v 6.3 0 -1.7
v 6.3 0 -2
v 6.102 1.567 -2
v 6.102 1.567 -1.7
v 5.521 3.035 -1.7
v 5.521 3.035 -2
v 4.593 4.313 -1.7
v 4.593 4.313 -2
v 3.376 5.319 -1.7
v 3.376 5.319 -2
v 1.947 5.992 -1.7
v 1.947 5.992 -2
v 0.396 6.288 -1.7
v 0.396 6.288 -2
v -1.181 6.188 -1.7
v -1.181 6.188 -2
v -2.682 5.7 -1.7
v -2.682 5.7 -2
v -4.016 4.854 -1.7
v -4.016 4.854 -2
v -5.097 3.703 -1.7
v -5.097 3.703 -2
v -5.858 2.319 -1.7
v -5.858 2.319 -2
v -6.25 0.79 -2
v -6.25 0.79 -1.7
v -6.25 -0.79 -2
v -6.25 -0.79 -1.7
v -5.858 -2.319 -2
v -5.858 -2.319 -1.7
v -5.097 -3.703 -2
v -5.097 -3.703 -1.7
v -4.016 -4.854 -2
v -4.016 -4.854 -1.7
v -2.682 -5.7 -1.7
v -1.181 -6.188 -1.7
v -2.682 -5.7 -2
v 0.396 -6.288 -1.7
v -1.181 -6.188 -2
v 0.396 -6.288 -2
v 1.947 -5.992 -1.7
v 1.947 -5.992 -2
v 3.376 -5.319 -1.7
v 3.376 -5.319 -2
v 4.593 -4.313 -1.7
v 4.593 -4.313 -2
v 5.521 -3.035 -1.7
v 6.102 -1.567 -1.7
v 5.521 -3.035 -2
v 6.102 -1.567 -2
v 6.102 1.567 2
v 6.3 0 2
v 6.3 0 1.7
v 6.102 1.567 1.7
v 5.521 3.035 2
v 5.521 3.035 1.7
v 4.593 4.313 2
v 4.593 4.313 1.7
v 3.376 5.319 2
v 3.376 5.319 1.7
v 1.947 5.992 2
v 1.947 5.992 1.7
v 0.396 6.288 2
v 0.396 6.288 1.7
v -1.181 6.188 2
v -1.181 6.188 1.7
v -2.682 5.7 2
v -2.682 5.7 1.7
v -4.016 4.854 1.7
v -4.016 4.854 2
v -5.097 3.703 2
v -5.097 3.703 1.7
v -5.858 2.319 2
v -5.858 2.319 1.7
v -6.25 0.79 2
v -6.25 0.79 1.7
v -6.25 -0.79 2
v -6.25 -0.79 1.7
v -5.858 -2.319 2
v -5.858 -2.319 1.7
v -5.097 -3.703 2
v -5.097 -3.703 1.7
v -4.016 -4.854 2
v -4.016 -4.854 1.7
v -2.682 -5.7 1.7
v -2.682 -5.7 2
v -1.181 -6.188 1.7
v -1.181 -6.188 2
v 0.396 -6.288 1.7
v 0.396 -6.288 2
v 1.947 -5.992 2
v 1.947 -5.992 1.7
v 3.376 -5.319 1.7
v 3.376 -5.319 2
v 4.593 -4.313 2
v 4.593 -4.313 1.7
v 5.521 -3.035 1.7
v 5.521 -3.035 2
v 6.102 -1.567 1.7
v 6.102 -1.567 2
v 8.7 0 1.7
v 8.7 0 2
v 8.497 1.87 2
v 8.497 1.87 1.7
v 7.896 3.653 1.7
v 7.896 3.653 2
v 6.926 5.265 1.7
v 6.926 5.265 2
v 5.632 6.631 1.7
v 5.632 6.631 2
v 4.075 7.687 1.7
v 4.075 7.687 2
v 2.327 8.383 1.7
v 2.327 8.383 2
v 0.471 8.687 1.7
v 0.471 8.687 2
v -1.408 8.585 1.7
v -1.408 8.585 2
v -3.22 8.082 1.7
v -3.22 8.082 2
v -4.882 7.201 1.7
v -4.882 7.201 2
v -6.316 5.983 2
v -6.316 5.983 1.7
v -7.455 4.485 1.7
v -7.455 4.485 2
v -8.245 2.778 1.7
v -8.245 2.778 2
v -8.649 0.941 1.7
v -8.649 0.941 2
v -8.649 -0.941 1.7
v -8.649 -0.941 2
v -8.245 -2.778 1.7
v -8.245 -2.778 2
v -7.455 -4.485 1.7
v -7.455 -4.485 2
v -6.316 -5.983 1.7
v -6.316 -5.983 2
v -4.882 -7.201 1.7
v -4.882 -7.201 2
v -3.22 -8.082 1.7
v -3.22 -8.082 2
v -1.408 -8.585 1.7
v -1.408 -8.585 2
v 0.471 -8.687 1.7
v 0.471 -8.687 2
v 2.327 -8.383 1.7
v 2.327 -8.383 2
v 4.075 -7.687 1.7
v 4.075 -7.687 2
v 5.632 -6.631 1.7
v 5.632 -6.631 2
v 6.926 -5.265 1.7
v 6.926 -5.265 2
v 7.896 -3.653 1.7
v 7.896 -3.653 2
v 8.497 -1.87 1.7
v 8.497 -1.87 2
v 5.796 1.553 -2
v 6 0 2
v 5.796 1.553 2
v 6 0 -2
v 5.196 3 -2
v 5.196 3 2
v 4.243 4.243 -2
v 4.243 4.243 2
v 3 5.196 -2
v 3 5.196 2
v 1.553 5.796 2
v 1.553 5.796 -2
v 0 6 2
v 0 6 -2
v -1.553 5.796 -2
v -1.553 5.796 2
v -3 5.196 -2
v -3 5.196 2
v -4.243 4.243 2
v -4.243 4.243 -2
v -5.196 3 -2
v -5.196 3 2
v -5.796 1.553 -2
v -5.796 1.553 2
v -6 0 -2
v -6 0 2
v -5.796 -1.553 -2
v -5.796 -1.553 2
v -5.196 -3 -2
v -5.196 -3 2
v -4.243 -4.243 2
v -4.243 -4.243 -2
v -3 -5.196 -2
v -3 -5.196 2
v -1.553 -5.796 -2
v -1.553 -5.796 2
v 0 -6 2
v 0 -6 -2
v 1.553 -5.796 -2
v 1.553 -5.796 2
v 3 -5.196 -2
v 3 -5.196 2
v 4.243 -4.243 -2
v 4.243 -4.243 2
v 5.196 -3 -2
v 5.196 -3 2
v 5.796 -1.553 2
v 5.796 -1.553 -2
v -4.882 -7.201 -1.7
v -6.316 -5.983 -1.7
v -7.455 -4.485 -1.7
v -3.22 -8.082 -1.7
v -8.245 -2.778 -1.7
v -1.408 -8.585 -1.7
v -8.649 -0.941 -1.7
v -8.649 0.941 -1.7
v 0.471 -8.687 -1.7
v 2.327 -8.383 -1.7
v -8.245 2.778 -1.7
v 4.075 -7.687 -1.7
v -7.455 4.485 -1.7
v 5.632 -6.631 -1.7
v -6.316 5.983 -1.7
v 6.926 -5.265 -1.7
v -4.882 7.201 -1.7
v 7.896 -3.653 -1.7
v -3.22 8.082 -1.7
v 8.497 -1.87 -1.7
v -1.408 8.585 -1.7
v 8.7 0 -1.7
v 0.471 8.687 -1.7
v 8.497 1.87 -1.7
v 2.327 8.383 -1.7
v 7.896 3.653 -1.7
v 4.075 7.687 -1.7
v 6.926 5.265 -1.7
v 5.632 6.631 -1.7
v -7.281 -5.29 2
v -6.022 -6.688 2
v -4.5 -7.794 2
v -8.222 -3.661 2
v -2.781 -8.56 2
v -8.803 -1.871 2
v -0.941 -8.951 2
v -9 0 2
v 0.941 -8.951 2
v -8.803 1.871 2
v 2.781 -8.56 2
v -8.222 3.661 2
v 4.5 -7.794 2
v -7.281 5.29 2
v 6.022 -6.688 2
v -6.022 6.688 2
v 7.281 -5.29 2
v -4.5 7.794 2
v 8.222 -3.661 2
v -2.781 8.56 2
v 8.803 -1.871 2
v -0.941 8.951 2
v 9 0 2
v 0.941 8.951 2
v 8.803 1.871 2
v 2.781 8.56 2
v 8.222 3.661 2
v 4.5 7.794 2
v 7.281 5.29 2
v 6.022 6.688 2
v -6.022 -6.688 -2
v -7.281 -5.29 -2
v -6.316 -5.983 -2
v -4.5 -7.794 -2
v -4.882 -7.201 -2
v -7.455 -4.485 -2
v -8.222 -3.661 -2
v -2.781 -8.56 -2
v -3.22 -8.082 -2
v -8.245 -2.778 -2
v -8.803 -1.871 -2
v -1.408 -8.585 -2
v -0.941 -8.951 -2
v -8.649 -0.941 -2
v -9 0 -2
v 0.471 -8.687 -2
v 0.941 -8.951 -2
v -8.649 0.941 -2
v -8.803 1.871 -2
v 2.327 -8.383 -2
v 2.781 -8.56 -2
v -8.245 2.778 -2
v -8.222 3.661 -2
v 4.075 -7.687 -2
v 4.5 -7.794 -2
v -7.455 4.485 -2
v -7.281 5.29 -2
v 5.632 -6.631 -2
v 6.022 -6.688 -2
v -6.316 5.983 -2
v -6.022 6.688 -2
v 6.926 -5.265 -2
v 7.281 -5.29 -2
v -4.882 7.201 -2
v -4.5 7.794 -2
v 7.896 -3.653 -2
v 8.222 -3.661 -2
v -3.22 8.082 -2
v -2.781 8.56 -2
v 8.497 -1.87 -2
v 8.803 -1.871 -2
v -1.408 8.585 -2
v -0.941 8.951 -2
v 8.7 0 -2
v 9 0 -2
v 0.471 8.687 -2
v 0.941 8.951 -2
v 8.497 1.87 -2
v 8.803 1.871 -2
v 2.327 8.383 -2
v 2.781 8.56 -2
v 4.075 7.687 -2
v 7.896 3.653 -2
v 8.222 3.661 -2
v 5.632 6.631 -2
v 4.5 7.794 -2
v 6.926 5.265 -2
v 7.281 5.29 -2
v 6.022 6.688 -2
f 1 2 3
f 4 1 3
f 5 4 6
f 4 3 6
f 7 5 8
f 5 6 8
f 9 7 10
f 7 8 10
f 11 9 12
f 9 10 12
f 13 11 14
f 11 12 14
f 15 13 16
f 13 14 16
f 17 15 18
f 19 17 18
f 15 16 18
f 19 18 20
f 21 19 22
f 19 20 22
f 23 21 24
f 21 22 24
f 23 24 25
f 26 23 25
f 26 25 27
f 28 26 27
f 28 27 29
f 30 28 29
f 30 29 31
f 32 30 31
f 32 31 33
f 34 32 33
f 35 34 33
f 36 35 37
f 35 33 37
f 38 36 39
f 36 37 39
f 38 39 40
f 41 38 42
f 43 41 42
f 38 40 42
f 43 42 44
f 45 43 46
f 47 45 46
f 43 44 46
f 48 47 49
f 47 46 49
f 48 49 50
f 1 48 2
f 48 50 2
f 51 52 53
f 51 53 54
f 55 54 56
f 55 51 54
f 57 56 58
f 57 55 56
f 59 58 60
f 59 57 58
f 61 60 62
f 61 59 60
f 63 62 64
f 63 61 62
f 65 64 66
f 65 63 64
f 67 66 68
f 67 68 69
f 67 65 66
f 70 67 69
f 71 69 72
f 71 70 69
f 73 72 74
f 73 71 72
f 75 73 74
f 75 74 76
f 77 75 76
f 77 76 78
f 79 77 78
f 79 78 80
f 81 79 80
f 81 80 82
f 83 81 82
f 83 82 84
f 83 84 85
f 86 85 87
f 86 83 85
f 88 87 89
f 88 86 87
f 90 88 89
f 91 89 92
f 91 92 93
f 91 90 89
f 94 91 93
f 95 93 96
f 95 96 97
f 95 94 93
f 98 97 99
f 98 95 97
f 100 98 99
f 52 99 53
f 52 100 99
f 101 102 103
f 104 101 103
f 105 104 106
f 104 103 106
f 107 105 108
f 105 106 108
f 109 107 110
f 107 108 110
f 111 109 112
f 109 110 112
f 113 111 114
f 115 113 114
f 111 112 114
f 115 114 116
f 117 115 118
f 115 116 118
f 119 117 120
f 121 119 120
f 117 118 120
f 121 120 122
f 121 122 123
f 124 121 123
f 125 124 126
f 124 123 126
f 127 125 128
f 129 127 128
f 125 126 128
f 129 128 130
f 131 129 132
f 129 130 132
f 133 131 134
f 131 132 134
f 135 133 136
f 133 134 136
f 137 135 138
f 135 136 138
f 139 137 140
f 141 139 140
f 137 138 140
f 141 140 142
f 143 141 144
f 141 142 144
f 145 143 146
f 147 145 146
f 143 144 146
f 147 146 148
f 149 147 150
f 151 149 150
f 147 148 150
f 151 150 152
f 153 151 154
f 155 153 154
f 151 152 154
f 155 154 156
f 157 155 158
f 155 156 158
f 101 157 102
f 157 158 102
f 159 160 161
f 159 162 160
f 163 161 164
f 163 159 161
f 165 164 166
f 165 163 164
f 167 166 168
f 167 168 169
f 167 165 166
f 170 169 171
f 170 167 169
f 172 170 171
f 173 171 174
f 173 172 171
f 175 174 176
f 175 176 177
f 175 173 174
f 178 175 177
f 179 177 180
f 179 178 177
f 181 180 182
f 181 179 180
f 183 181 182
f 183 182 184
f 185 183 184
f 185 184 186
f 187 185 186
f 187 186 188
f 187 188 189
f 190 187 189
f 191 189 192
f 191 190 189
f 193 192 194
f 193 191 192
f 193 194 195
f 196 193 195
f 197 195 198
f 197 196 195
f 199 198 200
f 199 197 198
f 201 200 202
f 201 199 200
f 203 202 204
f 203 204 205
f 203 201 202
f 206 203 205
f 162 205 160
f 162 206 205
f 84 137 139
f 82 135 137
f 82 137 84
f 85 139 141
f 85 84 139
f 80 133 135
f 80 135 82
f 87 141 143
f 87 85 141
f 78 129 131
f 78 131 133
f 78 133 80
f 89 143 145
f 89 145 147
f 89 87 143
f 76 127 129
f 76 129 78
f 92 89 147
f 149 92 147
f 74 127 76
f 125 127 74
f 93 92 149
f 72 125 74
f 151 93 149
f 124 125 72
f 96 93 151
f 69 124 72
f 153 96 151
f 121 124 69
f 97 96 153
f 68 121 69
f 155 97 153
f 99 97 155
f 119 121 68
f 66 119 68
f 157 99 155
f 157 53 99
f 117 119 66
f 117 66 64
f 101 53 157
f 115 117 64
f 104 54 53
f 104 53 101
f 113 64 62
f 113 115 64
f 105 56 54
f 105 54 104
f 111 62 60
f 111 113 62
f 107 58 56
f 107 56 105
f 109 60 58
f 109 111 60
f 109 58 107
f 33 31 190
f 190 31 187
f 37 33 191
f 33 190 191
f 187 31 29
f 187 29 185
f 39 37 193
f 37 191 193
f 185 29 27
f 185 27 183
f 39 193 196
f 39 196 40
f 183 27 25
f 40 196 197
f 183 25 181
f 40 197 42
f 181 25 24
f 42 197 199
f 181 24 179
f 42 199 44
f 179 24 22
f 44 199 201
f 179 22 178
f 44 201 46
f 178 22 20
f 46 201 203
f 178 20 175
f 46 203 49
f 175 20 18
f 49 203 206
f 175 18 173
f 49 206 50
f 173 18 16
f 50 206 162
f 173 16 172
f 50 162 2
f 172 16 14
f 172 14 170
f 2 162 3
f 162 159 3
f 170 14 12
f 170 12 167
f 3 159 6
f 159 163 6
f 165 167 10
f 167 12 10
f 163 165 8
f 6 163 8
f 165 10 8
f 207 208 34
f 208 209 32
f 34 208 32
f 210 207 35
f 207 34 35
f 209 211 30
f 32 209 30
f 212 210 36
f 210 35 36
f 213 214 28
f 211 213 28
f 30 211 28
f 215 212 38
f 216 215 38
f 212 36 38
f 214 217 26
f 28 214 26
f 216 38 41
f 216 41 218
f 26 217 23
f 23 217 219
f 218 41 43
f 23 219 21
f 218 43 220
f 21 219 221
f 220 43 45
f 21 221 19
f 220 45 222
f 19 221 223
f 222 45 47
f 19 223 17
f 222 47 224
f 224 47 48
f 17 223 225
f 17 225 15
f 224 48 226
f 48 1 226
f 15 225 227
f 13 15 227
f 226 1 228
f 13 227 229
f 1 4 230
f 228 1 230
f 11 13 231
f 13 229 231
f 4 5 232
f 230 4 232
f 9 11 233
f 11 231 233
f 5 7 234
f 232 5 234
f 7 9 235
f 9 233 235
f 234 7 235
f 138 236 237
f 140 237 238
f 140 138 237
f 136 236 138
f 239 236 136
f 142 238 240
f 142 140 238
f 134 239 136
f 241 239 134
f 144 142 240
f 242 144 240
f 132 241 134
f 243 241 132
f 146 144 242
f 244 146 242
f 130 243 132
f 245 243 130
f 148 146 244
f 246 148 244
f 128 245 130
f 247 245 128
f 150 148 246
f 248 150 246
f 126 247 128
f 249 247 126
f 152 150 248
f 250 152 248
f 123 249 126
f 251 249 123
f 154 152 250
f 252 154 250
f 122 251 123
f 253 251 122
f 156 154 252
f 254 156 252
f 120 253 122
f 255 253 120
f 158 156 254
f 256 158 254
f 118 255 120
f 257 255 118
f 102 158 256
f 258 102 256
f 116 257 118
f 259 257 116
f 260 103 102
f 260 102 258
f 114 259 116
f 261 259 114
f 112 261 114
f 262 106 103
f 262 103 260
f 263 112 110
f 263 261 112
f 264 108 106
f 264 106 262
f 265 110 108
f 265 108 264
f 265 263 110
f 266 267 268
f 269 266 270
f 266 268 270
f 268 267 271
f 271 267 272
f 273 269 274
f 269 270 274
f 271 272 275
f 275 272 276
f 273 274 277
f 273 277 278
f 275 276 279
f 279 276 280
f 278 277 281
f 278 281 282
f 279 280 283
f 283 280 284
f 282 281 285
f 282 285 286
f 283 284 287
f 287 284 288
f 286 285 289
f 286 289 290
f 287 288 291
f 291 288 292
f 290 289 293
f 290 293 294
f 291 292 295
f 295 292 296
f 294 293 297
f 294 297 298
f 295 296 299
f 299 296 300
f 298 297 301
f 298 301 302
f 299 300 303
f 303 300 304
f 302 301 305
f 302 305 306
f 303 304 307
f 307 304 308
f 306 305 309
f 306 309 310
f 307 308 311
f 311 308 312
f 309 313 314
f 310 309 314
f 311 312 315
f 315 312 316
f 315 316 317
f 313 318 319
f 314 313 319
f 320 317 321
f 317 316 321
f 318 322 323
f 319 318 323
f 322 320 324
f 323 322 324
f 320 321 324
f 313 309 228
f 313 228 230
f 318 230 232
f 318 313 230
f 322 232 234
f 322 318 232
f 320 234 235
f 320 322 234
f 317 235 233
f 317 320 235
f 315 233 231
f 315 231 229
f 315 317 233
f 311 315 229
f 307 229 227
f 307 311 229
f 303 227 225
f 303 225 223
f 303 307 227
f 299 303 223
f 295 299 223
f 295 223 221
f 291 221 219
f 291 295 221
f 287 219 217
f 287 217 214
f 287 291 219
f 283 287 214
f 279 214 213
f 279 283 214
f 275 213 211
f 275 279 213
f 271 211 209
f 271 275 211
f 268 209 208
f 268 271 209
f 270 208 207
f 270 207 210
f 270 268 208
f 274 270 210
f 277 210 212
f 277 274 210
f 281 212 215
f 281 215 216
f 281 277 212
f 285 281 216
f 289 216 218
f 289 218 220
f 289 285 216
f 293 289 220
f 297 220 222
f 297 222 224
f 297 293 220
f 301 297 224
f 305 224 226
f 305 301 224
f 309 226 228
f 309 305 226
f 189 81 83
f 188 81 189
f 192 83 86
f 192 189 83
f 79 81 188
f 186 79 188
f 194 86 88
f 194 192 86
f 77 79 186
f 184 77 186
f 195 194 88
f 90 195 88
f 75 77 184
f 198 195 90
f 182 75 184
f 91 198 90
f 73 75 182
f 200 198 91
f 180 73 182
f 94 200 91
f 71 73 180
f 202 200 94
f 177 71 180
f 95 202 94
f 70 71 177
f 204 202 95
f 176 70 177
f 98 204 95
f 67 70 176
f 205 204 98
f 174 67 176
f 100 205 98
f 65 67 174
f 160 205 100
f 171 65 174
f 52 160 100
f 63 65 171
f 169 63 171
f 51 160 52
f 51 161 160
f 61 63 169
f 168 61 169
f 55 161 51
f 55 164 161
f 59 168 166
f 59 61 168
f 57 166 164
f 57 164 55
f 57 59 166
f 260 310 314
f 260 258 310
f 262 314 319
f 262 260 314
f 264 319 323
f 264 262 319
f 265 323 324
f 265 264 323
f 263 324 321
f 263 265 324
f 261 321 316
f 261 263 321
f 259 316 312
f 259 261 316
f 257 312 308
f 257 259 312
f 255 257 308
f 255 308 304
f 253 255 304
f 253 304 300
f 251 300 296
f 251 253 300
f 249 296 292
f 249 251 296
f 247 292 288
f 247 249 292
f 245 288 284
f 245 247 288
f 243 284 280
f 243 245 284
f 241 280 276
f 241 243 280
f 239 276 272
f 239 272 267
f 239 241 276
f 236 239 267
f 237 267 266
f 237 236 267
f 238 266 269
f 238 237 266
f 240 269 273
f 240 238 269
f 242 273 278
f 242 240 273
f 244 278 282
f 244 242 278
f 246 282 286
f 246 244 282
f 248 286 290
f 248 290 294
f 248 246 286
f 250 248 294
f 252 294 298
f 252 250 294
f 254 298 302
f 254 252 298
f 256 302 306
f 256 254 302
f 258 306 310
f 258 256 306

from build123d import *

# Parameters (mm, degrees)
SKETCH_1_R          = 9
SKETCH_1_R_2        = 6
EXTRUDE_1_DEPTH     = 2
SKETCH_2_R          = 8.7
SKETCH_2_R_2        = 6.3
CUT_EXTRUDE_1_DEPTH = 0.3


with BuildPart() as part:
    # 草图1 → 凸台-拉伸1 (new, symmetric)
    with BuildSketch(Plane.XY):
        Circle(SKETCH_1_R)
        Circle(SKETCH_1_R_2, mode=Mode.SUBTRACT)
    extrude(amount=EXTRUDE_1_DEPTH, both=True)

    # 草图2 → 切除-拉伸1 (cut)
    with BuildSketch(Plane.XY.offset(2)):
        Circle(SKETCH_2_R)
        Circle(SKETCH_2_R_2, mode=Mode.SUBTRACT)
    cut_extrude_1 = extrude(amount=-CUT_EXTRUDE_1_DEPTH, mode=Mode.SUBTRACT)

    # 镜向1: 切除-拉伸1 across plane
    add(cut_extrude_1.mirror(Plane.XY), mode=Mode.SUBTRACT)


solid = part.part
